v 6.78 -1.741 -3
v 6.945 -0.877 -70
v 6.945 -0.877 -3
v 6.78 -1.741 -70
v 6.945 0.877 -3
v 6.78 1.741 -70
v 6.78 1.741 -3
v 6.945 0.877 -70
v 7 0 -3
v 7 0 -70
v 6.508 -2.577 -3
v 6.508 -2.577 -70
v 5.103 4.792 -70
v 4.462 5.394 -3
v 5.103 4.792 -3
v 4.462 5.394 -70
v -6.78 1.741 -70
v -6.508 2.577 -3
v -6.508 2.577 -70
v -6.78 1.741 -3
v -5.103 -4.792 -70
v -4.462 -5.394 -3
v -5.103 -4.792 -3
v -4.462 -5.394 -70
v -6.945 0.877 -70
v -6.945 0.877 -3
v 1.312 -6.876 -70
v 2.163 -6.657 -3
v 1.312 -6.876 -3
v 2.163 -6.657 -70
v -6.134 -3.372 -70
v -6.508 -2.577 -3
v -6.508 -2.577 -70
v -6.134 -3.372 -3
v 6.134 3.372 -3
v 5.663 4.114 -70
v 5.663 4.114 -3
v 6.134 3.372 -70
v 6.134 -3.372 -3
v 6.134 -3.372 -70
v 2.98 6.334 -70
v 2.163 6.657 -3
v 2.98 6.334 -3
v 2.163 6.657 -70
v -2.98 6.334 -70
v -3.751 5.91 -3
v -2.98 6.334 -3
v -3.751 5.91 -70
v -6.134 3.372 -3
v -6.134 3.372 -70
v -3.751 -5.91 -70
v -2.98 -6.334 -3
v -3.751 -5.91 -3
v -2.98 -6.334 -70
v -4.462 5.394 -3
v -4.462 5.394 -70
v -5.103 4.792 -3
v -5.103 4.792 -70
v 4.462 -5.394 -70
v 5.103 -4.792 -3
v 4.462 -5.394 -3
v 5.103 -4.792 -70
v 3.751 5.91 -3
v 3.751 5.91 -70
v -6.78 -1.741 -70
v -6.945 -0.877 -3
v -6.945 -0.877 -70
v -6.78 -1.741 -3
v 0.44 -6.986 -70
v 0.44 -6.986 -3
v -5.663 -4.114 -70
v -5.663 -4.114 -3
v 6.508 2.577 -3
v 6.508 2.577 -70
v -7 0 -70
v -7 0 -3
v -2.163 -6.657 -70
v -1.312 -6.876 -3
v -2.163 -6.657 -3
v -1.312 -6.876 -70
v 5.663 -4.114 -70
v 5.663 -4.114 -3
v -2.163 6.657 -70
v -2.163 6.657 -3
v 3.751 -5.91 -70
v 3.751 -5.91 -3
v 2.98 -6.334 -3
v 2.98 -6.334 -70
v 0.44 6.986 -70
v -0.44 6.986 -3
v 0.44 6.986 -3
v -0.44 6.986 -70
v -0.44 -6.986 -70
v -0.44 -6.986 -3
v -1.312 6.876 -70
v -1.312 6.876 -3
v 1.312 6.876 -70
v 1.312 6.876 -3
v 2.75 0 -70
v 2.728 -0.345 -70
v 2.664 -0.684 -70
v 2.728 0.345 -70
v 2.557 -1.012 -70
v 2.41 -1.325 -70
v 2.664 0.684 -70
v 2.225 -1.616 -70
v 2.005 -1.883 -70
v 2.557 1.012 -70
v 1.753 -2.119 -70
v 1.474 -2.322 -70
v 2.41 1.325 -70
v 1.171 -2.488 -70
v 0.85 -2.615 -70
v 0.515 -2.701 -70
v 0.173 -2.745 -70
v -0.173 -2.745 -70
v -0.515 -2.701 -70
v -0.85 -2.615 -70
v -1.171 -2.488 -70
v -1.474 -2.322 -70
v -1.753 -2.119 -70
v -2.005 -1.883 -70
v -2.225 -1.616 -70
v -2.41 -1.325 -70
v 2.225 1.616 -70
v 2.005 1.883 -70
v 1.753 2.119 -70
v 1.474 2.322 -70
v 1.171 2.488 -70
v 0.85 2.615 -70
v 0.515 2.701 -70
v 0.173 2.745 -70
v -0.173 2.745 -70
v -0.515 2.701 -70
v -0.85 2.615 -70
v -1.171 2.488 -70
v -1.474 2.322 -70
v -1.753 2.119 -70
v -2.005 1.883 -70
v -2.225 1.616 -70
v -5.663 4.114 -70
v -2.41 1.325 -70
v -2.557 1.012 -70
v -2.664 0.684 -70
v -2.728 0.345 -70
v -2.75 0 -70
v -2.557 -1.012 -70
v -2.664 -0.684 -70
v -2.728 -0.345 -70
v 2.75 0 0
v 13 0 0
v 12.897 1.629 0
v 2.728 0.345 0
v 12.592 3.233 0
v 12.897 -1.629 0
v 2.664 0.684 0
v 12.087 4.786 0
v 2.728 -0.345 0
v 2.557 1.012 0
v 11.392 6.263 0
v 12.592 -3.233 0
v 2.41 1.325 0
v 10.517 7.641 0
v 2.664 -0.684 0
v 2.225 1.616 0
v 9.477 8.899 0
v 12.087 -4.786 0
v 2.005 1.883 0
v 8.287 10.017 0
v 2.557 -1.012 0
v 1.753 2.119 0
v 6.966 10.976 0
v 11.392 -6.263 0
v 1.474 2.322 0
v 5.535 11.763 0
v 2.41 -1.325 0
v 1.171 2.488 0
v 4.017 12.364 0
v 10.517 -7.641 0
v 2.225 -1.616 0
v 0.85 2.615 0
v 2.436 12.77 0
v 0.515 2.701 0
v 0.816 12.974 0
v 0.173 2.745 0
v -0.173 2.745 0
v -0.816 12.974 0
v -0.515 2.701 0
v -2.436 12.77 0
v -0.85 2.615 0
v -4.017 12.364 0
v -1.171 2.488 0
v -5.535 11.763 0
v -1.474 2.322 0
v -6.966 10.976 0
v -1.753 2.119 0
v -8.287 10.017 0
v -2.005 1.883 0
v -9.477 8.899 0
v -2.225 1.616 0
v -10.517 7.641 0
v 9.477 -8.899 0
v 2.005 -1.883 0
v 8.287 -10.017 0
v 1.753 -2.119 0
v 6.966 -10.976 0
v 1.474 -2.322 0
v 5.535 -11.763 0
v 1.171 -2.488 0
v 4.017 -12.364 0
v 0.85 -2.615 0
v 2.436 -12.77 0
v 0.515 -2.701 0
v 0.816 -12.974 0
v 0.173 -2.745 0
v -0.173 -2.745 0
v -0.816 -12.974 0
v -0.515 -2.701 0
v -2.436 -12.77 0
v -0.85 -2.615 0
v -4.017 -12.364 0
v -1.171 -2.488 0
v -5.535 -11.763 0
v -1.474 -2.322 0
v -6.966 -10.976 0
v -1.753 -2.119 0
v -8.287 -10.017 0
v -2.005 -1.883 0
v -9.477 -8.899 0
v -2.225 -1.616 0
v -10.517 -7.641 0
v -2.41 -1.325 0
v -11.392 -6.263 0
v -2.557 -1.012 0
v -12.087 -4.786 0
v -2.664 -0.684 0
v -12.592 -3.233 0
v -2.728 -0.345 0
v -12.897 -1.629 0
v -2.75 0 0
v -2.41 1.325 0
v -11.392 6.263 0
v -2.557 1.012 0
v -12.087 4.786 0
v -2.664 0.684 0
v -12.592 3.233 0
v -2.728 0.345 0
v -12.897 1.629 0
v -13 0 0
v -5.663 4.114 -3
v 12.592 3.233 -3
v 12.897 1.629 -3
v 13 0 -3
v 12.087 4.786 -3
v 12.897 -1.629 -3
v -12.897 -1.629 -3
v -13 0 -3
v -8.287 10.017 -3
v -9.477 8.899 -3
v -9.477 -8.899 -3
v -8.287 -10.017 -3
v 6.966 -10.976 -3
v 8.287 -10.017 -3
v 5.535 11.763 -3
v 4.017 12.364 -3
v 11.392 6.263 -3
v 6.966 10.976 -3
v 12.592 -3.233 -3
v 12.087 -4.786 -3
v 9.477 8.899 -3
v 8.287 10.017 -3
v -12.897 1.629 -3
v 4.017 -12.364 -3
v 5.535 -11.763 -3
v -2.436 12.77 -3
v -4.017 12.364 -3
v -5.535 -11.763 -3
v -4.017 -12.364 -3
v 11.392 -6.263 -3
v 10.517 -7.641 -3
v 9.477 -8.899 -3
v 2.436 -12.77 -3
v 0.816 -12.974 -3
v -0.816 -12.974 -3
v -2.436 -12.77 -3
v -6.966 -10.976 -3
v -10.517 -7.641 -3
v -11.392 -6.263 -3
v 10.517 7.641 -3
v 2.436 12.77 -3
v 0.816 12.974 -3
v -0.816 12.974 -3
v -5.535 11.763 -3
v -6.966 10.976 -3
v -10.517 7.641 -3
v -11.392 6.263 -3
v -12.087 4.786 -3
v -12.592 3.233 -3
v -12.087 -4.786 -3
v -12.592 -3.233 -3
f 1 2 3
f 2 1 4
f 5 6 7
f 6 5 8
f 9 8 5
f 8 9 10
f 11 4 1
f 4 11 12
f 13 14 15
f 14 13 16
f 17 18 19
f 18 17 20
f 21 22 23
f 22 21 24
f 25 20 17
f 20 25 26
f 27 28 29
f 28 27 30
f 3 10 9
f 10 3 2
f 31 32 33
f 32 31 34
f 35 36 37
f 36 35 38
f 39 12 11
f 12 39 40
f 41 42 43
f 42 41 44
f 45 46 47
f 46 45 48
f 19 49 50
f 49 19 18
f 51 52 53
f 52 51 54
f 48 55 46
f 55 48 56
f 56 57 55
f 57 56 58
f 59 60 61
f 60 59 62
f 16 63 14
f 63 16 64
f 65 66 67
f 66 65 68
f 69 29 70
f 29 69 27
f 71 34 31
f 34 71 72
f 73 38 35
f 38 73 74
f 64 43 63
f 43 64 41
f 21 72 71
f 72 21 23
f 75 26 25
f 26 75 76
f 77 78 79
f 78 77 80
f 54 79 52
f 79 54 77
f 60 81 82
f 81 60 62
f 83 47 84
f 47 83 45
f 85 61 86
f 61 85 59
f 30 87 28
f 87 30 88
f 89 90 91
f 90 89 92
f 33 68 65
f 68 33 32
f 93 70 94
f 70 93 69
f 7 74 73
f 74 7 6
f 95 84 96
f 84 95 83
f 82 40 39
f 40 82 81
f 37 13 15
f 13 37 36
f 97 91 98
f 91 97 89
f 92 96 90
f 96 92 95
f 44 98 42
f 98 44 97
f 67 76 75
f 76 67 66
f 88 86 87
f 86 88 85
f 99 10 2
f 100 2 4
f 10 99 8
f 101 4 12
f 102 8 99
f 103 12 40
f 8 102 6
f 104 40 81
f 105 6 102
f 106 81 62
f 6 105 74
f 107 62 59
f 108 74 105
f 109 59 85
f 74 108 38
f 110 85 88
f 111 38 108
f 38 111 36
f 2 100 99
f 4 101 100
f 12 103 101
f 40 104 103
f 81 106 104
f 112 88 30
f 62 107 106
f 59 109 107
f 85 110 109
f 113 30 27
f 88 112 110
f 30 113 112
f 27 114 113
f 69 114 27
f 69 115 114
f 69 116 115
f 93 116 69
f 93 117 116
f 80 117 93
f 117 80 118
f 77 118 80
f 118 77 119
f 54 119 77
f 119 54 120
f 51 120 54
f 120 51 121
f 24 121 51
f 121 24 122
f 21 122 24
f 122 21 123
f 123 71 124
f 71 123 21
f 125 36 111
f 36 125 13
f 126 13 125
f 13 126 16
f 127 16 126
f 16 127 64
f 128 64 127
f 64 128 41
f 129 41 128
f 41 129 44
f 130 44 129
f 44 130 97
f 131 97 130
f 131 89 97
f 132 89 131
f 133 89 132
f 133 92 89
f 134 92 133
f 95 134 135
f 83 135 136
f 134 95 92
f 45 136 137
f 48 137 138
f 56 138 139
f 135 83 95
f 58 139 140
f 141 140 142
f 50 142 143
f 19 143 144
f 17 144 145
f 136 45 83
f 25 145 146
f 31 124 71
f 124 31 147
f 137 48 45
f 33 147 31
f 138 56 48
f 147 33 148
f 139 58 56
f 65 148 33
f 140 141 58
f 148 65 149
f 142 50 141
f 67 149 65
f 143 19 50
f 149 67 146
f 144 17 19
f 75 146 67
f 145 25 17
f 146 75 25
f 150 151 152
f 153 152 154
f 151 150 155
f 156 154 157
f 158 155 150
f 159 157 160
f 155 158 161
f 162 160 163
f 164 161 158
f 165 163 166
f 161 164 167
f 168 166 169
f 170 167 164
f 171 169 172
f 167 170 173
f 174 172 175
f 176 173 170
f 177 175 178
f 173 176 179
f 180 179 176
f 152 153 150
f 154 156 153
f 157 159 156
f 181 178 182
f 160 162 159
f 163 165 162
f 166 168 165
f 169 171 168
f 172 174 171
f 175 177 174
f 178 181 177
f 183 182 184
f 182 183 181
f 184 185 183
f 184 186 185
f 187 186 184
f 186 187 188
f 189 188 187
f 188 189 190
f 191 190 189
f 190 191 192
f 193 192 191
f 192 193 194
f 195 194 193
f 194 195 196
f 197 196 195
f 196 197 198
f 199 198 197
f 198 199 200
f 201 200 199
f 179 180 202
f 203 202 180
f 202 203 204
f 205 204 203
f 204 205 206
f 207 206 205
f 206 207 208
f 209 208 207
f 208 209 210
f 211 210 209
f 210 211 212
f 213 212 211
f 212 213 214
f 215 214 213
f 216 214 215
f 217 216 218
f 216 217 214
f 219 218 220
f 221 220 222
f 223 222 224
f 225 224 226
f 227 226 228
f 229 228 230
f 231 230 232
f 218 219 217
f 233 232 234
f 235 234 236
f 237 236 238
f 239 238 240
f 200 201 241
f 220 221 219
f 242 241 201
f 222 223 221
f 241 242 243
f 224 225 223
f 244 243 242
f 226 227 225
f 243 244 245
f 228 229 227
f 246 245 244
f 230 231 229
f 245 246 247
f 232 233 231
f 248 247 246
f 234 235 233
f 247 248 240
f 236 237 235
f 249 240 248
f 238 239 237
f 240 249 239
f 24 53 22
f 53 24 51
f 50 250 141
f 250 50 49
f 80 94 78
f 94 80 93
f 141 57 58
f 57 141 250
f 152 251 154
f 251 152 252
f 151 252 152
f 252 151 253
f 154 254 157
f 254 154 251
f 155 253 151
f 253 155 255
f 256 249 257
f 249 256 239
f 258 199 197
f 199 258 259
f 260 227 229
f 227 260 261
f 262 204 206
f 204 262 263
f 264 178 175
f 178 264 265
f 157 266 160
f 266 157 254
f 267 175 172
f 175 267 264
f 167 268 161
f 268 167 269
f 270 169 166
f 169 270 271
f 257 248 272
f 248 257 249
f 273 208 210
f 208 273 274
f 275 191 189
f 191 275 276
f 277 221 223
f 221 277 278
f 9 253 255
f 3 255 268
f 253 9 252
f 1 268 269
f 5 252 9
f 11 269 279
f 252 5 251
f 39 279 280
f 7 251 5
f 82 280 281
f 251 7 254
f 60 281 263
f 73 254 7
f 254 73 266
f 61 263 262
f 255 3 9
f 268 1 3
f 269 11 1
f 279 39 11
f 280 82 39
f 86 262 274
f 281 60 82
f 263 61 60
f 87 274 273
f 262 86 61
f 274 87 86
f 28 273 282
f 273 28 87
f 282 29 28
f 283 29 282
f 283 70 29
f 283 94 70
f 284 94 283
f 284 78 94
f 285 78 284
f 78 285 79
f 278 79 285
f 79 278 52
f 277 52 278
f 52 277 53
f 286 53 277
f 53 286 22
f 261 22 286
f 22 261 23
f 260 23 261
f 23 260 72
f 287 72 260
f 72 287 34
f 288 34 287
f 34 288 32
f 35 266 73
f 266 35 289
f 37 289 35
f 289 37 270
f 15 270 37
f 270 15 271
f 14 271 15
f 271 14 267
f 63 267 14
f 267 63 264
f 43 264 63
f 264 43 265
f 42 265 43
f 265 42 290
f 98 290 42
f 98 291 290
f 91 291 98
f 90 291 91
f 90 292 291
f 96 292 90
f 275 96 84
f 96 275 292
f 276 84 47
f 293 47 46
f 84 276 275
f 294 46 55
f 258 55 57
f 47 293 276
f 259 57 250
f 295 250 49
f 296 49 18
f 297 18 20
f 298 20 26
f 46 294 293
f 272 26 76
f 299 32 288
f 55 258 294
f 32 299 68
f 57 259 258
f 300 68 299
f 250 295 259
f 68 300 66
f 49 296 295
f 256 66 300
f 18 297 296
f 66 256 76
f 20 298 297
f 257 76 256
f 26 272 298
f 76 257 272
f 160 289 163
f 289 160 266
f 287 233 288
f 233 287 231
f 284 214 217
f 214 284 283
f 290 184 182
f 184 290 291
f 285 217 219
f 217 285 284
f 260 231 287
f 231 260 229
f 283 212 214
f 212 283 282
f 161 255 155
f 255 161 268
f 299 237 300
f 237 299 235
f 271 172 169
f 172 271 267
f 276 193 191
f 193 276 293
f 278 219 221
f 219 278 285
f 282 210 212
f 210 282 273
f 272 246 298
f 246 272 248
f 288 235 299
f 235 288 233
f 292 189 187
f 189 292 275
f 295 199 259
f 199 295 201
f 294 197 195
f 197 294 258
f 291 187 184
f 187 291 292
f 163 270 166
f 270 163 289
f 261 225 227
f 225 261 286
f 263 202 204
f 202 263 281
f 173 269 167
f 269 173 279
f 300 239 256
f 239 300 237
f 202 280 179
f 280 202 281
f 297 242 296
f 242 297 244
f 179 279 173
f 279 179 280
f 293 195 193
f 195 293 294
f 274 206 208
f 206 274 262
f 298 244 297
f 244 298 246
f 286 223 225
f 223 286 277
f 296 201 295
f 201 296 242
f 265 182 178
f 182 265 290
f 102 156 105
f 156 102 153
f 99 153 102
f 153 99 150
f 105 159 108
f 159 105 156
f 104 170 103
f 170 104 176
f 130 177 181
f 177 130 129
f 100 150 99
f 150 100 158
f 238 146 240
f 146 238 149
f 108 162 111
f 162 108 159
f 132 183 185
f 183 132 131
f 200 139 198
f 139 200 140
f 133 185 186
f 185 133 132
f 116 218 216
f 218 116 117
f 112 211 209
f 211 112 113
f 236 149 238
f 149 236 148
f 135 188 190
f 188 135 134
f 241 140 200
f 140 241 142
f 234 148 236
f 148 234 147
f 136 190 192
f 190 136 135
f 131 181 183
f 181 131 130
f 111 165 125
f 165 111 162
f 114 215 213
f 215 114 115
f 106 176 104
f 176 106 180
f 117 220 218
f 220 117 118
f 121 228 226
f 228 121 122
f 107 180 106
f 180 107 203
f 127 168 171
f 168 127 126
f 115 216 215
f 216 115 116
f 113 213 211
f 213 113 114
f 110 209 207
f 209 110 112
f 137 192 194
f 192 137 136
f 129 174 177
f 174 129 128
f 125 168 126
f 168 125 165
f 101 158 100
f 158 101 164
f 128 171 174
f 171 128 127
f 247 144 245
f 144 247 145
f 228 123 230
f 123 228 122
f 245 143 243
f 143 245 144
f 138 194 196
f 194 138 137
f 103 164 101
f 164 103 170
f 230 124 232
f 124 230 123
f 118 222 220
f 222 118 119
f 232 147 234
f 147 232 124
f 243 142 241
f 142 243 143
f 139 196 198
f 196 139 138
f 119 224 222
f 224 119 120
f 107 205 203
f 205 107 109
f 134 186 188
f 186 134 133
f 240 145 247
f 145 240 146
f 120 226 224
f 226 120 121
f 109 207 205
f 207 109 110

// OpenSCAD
$fn = 50;


difference() {
	union() {
		translate(v = [0, 0, -70.0000000000]) {
			cylinder(h = 70, r = 7.0000000000);
		}
		translate(v = [0, 0, -3.0000000000]) {
			cylinder(h = 3, r = 13.0000000000);
		}
	}
	union() {
		#translate(v = [0, 0, -70]) {
			cylinder(h = 70, r = 2.7500000000);
		}
	}
}
